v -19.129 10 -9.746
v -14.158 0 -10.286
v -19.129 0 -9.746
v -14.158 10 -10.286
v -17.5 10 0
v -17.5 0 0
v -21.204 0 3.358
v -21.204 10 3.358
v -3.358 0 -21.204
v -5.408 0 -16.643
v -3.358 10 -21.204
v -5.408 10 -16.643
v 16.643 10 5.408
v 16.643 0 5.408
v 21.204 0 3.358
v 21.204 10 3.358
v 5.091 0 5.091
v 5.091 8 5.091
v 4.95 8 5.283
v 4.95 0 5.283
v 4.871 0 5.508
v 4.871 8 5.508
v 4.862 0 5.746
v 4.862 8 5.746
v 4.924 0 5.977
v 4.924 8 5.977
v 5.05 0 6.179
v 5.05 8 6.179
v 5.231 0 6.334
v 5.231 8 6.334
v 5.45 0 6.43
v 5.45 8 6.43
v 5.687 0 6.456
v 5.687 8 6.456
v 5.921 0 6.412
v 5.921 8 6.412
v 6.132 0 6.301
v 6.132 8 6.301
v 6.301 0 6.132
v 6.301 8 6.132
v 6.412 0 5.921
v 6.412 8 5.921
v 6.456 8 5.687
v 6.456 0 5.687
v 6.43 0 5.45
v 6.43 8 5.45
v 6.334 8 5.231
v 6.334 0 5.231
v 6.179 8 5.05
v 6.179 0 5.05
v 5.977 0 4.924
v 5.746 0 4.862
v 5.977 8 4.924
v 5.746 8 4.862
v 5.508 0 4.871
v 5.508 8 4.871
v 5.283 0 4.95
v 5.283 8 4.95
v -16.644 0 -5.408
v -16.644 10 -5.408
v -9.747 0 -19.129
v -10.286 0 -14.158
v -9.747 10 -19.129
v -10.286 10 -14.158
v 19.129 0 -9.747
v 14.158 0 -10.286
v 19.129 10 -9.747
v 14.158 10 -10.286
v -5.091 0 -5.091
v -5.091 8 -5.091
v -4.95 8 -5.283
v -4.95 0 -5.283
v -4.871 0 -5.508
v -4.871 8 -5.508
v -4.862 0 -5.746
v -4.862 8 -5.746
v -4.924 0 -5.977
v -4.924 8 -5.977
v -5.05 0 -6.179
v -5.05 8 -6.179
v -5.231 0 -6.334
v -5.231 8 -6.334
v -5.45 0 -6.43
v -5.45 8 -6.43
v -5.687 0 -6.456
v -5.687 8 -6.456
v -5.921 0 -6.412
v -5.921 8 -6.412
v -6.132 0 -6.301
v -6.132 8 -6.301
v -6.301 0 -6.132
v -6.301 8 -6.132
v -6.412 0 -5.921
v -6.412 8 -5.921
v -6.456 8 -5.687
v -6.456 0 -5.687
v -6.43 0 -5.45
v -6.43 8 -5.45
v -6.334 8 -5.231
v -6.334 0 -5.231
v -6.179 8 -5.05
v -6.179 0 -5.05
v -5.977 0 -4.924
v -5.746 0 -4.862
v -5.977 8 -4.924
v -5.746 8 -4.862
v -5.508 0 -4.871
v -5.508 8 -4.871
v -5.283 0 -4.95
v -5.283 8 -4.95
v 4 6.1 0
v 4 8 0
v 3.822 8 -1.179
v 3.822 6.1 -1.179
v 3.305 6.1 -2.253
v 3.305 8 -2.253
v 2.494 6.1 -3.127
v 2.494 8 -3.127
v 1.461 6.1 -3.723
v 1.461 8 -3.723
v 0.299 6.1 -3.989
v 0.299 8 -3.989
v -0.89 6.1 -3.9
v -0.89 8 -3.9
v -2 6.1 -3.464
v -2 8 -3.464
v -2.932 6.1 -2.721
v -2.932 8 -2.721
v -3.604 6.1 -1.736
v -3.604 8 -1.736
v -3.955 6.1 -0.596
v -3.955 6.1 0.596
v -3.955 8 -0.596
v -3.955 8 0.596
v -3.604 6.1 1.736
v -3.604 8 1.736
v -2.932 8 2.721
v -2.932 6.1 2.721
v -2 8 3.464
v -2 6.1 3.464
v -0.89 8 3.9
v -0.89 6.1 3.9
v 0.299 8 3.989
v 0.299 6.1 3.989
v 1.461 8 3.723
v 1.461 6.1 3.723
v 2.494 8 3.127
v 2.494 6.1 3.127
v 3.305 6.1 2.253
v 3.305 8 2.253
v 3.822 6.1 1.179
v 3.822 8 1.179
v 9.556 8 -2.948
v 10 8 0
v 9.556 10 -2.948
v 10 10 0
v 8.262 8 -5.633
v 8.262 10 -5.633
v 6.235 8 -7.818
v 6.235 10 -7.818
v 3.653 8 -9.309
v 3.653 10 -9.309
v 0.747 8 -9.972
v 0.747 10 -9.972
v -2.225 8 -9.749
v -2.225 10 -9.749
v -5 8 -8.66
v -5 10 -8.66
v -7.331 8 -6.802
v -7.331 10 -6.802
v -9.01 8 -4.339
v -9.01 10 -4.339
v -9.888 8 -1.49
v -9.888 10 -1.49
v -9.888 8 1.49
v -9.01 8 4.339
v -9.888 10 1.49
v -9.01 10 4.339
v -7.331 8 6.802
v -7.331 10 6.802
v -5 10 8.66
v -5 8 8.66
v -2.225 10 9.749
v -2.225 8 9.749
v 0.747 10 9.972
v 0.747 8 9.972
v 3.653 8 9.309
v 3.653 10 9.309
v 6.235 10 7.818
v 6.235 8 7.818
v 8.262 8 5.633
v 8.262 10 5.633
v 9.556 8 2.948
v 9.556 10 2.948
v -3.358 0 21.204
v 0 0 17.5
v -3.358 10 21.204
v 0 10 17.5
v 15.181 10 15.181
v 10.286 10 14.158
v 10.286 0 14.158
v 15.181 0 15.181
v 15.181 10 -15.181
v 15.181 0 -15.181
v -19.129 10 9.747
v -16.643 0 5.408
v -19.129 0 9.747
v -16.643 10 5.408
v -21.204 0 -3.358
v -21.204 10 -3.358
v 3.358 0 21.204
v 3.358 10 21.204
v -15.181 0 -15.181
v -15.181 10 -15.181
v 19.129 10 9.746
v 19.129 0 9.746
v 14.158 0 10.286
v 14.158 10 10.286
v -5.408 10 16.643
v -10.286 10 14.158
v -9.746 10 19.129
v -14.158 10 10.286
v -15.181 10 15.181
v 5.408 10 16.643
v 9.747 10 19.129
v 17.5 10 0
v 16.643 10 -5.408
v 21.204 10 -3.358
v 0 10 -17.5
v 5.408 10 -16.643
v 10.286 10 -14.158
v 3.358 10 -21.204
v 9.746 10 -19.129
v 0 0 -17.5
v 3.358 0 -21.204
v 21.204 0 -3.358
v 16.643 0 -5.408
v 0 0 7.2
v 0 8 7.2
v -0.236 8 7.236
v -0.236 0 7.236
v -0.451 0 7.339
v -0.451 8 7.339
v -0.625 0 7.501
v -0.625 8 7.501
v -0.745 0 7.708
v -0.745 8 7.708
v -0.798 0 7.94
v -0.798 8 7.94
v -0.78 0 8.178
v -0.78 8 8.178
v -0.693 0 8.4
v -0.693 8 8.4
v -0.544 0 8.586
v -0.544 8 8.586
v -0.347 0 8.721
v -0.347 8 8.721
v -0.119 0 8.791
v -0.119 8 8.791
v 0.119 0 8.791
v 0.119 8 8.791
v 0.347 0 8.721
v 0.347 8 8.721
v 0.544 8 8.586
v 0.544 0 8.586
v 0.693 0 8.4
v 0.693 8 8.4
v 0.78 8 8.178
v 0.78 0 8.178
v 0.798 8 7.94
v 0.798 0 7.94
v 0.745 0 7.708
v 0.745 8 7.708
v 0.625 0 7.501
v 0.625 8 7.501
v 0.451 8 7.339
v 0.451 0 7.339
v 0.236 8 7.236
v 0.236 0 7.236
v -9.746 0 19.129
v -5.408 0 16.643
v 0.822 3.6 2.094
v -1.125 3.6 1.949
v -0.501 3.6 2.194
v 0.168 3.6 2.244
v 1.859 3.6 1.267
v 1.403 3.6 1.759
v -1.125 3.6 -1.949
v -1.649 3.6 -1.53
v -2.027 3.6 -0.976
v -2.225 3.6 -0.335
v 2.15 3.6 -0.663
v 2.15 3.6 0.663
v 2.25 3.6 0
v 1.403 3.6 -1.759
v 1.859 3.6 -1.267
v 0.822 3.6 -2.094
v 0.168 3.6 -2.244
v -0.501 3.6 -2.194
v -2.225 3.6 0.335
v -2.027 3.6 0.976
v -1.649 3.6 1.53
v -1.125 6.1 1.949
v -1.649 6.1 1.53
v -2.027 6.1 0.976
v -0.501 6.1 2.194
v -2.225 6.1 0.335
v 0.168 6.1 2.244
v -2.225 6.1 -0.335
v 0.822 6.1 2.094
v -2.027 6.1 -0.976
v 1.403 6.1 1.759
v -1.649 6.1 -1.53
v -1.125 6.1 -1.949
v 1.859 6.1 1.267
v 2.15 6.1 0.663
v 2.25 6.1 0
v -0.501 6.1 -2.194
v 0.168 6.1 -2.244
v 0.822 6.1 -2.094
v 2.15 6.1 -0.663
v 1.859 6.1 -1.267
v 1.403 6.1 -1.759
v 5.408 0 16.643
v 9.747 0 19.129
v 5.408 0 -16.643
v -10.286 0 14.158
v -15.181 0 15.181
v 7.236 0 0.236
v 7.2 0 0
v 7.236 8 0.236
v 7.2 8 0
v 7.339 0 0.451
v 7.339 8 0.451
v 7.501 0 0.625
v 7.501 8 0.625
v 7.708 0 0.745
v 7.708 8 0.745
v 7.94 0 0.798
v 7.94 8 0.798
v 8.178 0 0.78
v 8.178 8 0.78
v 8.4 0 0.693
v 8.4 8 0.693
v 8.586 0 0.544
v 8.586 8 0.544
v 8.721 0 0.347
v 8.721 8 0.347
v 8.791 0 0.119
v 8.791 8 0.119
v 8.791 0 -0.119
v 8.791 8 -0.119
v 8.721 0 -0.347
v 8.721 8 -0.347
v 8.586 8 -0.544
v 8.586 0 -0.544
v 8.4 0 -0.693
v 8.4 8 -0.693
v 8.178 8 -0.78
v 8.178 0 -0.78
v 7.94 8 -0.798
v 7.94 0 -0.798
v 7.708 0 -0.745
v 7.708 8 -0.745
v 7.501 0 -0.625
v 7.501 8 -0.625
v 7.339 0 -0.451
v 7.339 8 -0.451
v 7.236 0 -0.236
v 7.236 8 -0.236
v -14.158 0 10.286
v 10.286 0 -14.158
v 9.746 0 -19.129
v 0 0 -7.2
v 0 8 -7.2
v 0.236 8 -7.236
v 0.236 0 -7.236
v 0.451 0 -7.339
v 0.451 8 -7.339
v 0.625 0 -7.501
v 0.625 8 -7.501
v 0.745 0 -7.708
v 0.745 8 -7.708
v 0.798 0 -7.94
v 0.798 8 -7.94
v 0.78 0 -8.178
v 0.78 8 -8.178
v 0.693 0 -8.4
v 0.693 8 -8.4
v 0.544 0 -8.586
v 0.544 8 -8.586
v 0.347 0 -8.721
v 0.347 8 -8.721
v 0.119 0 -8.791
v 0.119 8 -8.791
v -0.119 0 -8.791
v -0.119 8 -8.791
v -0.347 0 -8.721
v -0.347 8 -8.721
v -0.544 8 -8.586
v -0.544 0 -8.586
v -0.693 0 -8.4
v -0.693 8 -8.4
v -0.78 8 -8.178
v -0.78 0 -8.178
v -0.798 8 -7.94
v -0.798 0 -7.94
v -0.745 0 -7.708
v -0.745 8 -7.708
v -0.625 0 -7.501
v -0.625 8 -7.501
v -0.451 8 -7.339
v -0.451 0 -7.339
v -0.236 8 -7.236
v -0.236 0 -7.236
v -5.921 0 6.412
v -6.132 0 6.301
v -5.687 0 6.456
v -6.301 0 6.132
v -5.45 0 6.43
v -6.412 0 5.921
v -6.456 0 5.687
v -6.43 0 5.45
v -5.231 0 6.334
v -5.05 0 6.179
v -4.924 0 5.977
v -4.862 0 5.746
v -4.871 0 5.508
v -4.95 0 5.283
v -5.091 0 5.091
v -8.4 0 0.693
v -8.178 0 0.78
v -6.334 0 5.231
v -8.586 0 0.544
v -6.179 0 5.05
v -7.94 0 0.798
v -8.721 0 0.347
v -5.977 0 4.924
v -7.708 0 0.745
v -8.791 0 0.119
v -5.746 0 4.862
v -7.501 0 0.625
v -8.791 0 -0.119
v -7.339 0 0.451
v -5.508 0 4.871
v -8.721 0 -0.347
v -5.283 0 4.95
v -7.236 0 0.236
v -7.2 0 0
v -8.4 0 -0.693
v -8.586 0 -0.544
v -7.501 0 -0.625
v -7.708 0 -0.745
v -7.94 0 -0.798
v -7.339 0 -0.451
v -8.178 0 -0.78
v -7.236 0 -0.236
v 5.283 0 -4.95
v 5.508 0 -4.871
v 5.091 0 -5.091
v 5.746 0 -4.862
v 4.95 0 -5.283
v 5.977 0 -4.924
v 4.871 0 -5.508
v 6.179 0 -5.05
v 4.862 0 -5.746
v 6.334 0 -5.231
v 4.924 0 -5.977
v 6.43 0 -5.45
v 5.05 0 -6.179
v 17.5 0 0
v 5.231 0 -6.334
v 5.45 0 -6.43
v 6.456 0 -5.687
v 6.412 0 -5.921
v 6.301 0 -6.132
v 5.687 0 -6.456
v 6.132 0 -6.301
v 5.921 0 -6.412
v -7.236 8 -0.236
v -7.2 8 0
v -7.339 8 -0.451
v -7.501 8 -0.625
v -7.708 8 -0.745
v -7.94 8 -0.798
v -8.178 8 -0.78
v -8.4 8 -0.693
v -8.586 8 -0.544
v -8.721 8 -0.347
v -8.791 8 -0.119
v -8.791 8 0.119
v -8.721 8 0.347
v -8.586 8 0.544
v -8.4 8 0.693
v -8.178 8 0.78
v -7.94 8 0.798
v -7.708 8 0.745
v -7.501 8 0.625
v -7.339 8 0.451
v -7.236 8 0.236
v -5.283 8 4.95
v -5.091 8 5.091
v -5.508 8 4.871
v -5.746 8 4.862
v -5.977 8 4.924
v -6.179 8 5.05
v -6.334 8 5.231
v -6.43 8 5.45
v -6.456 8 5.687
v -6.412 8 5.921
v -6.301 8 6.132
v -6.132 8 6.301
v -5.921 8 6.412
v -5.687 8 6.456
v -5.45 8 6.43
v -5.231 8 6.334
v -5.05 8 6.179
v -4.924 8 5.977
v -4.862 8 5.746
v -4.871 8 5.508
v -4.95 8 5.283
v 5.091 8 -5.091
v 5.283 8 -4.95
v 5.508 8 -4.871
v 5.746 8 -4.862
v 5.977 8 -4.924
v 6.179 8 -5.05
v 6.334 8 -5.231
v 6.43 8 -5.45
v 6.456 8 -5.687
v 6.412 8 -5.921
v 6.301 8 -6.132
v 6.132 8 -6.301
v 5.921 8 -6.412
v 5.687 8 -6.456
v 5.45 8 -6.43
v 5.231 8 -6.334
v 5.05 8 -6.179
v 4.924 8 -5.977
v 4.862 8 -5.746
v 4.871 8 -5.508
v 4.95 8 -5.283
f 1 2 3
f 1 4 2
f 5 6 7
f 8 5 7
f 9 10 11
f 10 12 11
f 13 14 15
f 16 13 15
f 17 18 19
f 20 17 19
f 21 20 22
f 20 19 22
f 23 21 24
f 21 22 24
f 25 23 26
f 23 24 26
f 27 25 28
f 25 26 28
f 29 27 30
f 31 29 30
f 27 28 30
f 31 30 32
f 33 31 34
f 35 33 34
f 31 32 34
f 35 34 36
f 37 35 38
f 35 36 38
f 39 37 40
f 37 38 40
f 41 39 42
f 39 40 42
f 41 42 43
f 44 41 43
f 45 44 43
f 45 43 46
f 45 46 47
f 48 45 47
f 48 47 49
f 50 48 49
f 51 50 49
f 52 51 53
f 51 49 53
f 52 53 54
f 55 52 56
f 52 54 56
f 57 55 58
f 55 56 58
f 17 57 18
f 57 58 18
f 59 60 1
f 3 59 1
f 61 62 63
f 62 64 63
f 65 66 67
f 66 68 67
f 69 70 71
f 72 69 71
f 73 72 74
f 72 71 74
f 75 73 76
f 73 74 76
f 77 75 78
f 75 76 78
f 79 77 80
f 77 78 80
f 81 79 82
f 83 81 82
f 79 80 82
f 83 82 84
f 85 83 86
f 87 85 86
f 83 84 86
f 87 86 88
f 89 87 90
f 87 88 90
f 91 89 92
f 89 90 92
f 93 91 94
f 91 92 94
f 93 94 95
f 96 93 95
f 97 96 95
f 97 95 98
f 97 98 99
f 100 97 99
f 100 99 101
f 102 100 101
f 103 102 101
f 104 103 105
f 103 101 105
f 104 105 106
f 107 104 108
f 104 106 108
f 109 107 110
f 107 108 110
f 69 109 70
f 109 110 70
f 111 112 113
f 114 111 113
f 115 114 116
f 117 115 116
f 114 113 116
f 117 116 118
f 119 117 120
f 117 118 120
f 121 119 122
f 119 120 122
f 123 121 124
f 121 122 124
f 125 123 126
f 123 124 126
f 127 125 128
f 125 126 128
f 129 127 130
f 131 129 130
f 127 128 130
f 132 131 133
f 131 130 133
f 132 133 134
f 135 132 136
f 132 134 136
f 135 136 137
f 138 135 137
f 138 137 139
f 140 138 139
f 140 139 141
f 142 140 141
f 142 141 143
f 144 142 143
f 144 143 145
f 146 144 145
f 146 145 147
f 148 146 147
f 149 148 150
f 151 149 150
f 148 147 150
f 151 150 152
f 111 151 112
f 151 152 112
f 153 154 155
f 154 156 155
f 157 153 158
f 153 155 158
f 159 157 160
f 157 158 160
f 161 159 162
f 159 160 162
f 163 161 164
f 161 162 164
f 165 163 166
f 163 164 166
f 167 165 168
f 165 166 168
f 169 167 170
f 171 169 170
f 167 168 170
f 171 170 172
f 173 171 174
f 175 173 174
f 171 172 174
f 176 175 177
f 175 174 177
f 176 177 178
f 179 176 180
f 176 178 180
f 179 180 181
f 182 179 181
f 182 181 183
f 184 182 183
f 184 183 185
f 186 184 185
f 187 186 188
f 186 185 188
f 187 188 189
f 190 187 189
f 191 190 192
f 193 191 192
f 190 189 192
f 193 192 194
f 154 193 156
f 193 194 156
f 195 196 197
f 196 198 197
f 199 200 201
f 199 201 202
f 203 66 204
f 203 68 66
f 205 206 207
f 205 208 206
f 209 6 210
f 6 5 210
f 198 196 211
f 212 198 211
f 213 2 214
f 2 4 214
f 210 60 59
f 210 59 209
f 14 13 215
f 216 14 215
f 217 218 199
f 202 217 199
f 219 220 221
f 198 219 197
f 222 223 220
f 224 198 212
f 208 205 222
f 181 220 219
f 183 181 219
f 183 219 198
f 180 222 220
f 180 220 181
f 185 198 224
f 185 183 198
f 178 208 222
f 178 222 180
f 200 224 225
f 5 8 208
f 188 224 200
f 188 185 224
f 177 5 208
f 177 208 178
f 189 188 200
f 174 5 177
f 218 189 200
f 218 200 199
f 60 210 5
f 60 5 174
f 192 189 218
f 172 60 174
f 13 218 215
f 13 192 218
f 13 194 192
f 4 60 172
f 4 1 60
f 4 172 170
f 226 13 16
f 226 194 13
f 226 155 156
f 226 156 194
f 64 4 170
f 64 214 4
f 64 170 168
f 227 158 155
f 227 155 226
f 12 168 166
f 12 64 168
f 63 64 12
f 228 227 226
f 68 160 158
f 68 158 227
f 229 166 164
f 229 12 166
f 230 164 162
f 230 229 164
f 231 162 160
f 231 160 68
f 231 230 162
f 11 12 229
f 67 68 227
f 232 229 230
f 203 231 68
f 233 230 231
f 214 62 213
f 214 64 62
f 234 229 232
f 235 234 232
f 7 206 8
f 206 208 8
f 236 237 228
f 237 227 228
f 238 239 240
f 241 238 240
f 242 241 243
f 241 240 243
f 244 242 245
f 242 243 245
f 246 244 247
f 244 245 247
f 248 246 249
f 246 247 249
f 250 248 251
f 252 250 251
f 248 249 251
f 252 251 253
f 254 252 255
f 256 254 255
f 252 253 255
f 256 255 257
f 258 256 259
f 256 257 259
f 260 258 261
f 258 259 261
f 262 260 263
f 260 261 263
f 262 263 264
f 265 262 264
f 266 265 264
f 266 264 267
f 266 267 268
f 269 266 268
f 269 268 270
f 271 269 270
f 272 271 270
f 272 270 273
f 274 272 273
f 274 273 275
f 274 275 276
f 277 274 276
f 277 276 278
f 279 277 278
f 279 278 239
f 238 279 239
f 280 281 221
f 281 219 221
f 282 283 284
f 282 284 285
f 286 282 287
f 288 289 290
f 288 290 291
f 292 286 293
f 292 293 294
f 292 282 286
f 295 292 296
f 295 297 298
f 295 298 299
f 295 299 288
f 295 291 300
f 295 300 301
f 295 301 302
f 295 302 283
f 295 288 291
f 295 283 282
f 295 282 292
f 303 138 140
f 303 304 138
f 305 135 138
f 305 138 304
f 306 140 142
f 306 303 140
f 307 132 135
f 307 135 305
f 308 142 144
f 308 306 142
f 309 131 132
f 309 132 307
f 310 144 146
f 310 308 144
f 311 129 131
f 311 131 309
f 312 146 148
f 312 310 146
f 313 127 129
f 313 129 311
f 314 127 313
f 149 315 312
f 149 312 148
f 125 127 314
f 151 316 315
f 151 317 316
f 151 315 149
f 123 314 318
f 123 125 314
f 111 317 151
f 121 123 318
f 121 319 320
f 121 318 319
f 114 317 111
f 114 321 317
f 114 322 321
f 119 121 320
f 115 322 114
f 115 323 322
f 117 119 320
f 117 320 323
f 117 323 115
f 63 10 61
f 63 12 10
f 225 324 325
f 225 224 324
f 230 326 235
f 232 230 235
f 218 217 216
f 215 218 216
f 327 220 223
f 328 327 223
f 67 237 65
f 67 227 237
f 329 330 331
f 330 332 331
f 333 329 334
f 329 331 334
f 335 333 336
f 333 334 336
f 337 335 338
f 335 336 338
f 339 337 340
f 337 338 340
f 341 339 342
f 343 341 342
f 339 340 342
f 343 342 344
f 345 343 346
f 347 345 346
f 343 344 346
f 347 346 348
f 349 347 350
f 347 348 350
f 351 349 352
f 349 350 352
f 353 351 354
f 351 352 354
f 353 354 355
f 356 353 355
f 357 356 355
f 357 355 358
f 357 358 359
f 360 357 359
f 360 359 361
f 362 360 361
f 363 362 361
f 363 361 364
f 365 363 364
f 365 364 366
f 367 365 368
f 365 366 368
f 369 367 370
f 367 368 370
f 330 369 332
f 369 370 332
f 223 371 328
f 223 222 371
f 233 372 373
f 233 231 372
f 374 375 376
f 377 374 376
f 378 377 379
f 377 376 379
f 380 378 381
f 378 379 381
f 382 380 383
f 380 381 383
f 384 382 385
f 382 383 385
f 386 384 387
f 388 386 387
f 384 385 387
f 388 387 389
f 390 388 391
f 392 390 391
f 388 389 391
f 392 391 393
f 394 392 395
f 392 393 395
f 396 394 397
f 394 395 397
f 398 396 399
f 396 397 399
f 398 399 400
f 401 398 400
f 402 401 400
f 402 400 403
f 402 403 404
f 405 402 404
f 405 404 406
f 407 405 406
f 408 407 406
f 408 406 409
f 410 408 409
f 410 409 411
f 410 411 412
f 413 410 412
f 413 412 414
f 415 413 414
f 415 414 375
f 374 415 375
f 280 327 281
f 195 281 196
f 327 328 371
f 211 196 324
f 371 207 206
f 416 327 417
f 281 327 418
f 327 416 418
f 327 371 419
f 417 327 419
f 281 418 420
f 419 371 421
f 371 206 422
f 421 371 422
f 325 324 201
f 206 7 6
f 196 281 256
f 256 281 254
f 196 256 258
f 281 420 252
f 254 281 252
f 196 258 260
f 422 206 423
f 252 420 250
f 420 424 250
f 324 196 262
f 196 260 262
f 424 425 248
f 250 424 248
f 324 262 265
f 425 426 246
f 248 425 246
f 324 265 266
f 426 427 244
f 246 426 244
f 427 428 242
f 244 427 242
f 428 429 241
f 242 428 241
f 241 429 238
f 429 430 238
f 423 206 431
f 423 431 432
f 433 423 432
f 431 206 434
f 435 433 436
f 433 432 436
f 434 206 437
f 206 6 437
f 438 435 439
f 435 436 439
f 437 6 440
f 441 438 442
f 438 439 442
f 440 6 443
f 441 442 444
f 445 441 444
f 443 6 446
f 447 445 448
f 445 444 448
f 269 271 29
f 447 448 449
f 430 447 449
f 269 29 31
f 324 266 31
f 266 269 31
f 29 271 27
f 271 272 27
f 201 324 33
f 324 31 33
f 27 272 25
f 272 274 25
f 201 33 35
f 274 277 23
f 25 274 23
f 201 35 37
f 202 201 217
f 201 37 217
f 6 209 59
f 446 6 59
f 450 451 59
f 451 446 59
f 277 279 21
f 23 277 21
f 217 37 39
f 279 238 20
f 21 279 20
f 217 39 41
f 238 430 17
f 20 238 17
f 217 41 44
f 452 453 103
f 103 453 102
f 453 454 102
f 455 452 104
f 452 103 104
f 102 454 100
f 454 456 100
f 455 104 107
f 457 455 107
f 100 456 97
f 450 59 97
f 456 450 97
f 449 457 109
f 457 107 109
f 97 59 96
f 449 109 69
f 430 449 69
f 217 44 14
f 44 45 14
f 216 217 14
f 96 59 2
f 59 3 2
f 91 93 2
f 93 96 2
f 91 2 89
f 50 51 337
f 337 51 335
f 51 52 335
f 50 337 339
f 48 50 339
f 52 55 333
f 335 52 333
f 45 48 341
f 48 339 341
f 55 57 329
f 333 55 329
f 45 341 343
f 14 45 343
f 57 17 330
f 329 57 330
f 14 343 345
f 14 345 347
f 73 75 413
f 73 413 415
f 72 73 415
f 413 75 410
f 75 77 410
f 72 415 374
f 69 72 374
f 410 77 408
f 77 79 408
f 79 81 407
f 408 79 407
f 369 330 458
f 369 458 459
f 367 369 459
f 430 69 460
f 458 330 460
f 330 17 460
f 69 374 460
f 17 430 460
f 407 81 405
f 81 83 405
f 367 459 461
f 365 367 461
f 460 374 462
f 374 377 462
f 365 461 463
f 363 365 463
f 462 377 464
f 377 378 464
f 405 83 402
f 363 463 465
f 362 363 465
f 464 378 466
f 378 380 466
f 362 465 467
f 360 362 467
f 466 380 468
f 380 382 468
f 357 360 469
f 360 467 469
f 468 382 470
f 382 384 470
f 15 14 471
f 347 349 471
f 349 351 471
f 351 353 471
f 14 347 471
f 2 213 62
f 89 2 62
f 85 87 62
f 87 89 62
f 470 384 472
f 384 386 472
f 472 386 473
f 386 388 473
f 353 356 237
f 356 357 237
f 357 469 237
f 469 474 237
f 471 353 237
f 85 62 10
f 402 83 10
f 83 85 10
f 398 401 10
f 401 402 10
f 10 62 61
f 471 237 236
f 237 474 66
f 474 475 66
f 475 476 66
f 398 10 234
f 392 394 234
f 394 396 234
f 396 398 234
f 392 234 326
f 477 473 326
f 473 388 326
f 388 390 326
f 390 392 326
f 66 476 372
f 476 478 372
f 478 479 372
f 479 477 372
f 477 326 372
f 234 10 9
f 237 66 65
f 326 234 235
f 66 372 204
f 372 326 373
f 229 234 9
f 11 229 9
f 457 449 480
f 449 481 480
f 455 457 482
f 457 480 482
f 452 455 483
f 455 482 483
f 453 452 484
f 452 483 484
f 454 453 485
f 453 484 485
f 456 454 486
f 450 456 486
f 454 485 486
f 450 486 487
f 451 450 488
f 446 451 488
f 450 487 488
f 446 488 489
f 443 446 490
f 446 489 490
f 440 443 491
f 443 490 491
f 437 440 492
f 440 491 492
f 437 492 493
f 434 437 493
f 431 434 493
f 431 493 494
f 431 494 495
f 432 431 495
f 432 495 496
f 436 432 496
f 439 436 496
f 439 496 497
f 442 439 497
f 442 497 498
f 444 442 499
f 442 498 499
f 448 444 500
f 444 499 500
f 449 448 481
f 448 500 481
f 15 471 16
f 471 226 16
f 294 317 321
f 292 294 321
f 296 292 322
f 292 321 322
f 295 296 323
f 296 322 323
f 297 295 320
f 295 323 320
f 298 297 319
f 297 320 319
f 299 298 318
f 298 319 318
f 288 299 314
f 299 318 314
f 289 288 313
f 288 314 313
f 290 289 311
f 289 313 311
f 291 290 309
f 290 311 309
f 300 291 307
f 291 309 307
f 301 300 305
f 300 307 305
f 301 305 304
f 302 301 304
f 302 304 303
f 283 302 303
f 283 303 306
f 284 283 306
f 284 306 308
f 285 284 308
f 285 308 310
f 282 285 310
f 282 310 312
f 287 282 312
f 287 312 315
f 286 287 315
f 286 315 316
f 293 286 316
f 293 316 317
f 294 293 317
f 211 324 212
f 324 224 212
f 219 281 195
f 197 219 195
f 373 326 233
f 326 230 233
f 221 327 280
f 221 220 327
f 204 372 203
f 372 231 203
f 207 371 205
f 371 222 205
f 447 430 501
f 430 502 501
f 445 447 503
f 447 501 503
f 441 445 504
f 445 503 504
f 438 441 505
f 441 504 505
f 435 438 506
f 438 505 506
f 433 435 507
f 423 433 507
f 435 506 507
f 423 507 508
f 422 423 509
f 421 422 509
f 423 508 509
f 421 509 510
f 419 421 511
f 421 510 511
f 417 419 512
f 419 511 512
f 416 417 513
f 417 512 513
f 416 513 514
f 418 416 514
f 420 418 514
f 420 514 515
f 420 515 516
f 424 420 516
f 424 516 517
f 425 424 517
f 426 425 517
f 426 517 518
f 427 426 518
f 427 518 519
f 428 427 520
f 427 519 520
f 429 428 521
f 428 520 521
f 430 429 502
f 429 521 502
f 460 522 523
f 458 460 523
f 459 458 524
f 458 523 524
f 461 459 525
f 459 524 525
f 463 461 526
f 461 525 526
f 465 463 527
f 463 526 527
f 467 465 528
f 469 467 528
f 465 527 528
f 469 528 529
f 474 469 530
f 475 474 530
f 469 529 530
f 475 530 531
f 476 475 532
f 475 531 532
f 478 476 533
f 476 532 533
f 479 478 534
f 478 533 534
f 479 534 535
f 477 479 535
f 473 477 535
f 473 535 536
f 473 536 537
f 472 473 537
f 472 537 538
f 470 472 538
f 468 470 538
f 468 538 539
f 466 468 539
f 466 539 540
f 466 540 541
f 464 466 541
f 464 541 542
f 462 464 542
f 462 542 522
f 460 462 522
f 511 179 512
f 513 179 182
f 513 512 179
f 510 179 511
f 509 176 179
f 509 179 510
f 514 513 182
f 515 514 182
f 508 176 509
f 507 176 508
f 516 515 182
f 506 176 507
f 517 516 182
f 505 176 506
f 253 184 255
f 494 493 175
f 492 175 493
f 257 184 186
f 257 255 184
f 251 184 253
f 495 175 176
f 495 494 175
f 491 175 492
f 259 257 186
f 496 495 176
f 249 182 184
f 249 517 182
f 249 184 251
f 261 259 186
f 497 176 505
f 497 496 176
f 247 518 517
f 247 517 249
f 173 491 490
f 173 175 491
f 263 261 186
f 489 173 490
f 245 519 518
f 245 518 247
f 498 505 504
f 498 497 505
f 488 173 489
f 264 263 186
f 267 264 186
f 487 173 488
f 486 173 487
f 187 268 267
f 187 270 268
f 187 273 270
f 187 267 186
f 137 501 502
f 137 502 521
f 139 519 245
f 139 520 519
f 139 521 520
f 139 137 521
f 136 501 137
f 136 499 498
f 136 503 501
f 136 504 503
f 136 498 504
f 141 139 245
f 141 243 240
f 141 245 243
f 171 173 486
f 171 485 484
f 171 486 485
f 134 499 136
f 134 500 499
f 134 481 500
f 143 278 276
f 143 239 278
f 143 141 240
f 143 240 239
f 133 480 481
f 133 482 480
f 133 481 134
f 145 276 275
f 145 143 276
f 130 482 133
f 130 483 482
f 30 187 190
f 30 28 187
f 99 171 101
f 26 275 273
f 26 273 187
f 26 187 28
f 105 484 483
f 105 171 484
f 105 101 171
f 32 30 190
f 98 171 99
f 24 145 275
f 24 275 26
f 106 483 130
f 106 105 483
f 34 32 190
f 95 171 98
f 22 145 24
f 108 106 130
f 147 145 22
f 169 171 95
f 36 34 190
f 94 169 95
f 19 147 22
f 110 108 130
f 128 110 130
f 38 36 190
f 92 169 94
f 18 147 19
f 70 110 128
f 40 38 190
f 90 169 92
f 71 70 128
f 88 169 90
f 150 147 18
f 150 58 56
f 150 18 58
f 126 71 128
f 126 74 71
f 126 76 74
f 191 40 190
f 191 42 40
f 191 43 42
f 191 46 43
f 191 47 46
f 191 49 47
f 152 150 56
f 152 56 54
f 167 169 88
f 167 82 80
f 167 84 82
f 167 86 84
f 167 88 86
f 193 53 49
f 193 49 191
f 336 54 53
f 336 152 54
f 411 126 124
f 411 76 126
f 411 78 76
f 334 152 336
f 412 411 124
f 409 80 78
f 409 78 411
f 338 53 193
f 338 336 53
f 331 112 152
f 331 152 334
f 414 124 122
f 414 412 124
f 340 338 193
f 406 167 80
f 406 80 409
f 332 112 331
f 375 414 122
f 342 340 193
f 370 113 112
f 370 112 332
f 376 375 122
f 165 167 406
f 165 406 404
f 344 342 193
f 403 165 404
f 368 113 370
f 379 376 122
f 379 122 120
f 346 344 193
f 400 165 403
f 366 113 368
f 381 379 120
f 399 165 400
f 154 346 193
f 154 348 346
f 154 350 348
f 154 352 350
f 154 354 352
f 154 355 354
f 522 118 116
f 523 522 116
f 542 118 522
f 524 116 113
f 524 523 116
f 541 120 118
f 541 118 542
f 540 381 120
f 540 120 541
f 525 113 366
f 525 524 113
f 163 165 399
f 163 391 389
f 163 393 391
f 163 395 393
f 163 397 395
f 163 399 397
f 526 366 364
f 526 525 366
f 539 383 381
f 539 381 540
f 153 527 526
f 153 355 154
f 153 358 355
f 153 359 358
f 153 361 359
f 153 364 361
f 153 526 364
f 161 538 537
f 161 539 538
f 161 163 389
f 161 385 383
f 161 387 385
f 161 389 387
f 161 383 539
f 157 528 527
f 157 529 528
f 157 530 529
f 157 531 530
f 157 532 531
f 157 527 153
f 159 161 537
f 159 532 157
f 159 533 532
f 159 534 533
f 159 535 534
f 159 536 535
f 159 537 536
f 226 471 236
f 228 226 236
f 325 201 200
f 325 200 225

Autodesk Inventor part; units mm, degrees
ref_plane "YZ Plane" through (0, 0, 0) normal (1, 0, 0) x (0, 1, 0)
ref_plane "XZ Plane" through (0, 0, 0) normal (0, 1, 0) x (-1, 0, 0)
ref_plane "XY Plane" through (0, 0, 0) normal (0, 0, 1) x (1, 0, 0)
sketch "Sketch1" plane through (0, 0, 0) normal (0, 1, 0) x (-1, 0, 0)
  circle A0 centre (0, 0) radius 17.5
  dimension "d0" = 35
extrude "Base" add sketch "Sketch1" along normal blind 10
sketch "Sketch2" plane through (0, 10, 0) normal (0, 1, 0) x (1, 0, 0)
  circle A0 centre (0, 0) radius 8
  circle A1 centre (-8, 0) radius 0.8
  dimension "d3" = 16
  dimension "d4" = 1.6
extrude "Mounting Hole" cut sketch "Sketch2" against normal through all contours A1 A0 | A0 A1 picked at (-7.7304, 0) picked at (-8.2616, 0.0332)
pattern_circular "Circular Pattern1" count 8 over 360 about axis through (0, 0, 0) along (0, 1, 0) of "Mounting Hole"
sketch "Sketch3" plane through (0, 10, 0) normal (0, 1, 0) x (1, 0, 0)
  arc A0 (-16.6435, 5.4078) -> (-17.5, 0) centre (0, 0) ccw
  line L0 (0, 0) -> (-16.6435, 5.4078) construction
  line L1 (0, 0) -> (-17.5, 0) construction
  line L2 (0, 0) -> (-25.2614, 4.001)
  line L3 (0, 0) -> (25.5763, 0) construction
  line L4 (-17.5, 0) -> (-21.2042, 3.3584)
  line L5 (-16.6435, 5.4078) -> (-21.2042, 3.3584)
  dimension "d11" = 18
  dimension "d12" = 171
  dimension "d13" = 5
extrude "Gear Tooth" add sketch "Sketch3" against normal blind 10
pattern_circular "Circular Pattern2" count 20 over 360 about axis through (0, 0, 0) along (0, 1, 0) of "Gear Tooth"
sketch "Sketch6" plane through (0, 10, 0) normal (0, 1, 0) x (1, 0, 0)
  point P0 (0, 0)
sketch "Sketch7" plane through (0, 10, 0) normal (0, 1, 0) x (1, 0, 0)
  circle A0 centre (0, 0) radius 10
  dimension "d26" = 20
extrude "Extrusion6" cut sketch "Sketch7" against normal blind 2
sketch "Sketch8" plane through (0, 8, 0) normal (0, 1, 0) x (1, 0, 0)
  circle A0 centre (0, 0) radius 4
  dimension "d29" = 8
extrude "Extrusion7" cut sketch "Sketch8" against normal blind 1.9
sketch "Sketch9" plane through (0, 6.1, 0) normal (0, 1, 0) x (1, 0, 0)
  circle A0 centre (0, 0) radius 2.25
  dimension "d32" = 4.5
extrude "Extrusion8" cut sketch "Sketch9" against normal blind 2.5
properties part number "JointSmallGear"
